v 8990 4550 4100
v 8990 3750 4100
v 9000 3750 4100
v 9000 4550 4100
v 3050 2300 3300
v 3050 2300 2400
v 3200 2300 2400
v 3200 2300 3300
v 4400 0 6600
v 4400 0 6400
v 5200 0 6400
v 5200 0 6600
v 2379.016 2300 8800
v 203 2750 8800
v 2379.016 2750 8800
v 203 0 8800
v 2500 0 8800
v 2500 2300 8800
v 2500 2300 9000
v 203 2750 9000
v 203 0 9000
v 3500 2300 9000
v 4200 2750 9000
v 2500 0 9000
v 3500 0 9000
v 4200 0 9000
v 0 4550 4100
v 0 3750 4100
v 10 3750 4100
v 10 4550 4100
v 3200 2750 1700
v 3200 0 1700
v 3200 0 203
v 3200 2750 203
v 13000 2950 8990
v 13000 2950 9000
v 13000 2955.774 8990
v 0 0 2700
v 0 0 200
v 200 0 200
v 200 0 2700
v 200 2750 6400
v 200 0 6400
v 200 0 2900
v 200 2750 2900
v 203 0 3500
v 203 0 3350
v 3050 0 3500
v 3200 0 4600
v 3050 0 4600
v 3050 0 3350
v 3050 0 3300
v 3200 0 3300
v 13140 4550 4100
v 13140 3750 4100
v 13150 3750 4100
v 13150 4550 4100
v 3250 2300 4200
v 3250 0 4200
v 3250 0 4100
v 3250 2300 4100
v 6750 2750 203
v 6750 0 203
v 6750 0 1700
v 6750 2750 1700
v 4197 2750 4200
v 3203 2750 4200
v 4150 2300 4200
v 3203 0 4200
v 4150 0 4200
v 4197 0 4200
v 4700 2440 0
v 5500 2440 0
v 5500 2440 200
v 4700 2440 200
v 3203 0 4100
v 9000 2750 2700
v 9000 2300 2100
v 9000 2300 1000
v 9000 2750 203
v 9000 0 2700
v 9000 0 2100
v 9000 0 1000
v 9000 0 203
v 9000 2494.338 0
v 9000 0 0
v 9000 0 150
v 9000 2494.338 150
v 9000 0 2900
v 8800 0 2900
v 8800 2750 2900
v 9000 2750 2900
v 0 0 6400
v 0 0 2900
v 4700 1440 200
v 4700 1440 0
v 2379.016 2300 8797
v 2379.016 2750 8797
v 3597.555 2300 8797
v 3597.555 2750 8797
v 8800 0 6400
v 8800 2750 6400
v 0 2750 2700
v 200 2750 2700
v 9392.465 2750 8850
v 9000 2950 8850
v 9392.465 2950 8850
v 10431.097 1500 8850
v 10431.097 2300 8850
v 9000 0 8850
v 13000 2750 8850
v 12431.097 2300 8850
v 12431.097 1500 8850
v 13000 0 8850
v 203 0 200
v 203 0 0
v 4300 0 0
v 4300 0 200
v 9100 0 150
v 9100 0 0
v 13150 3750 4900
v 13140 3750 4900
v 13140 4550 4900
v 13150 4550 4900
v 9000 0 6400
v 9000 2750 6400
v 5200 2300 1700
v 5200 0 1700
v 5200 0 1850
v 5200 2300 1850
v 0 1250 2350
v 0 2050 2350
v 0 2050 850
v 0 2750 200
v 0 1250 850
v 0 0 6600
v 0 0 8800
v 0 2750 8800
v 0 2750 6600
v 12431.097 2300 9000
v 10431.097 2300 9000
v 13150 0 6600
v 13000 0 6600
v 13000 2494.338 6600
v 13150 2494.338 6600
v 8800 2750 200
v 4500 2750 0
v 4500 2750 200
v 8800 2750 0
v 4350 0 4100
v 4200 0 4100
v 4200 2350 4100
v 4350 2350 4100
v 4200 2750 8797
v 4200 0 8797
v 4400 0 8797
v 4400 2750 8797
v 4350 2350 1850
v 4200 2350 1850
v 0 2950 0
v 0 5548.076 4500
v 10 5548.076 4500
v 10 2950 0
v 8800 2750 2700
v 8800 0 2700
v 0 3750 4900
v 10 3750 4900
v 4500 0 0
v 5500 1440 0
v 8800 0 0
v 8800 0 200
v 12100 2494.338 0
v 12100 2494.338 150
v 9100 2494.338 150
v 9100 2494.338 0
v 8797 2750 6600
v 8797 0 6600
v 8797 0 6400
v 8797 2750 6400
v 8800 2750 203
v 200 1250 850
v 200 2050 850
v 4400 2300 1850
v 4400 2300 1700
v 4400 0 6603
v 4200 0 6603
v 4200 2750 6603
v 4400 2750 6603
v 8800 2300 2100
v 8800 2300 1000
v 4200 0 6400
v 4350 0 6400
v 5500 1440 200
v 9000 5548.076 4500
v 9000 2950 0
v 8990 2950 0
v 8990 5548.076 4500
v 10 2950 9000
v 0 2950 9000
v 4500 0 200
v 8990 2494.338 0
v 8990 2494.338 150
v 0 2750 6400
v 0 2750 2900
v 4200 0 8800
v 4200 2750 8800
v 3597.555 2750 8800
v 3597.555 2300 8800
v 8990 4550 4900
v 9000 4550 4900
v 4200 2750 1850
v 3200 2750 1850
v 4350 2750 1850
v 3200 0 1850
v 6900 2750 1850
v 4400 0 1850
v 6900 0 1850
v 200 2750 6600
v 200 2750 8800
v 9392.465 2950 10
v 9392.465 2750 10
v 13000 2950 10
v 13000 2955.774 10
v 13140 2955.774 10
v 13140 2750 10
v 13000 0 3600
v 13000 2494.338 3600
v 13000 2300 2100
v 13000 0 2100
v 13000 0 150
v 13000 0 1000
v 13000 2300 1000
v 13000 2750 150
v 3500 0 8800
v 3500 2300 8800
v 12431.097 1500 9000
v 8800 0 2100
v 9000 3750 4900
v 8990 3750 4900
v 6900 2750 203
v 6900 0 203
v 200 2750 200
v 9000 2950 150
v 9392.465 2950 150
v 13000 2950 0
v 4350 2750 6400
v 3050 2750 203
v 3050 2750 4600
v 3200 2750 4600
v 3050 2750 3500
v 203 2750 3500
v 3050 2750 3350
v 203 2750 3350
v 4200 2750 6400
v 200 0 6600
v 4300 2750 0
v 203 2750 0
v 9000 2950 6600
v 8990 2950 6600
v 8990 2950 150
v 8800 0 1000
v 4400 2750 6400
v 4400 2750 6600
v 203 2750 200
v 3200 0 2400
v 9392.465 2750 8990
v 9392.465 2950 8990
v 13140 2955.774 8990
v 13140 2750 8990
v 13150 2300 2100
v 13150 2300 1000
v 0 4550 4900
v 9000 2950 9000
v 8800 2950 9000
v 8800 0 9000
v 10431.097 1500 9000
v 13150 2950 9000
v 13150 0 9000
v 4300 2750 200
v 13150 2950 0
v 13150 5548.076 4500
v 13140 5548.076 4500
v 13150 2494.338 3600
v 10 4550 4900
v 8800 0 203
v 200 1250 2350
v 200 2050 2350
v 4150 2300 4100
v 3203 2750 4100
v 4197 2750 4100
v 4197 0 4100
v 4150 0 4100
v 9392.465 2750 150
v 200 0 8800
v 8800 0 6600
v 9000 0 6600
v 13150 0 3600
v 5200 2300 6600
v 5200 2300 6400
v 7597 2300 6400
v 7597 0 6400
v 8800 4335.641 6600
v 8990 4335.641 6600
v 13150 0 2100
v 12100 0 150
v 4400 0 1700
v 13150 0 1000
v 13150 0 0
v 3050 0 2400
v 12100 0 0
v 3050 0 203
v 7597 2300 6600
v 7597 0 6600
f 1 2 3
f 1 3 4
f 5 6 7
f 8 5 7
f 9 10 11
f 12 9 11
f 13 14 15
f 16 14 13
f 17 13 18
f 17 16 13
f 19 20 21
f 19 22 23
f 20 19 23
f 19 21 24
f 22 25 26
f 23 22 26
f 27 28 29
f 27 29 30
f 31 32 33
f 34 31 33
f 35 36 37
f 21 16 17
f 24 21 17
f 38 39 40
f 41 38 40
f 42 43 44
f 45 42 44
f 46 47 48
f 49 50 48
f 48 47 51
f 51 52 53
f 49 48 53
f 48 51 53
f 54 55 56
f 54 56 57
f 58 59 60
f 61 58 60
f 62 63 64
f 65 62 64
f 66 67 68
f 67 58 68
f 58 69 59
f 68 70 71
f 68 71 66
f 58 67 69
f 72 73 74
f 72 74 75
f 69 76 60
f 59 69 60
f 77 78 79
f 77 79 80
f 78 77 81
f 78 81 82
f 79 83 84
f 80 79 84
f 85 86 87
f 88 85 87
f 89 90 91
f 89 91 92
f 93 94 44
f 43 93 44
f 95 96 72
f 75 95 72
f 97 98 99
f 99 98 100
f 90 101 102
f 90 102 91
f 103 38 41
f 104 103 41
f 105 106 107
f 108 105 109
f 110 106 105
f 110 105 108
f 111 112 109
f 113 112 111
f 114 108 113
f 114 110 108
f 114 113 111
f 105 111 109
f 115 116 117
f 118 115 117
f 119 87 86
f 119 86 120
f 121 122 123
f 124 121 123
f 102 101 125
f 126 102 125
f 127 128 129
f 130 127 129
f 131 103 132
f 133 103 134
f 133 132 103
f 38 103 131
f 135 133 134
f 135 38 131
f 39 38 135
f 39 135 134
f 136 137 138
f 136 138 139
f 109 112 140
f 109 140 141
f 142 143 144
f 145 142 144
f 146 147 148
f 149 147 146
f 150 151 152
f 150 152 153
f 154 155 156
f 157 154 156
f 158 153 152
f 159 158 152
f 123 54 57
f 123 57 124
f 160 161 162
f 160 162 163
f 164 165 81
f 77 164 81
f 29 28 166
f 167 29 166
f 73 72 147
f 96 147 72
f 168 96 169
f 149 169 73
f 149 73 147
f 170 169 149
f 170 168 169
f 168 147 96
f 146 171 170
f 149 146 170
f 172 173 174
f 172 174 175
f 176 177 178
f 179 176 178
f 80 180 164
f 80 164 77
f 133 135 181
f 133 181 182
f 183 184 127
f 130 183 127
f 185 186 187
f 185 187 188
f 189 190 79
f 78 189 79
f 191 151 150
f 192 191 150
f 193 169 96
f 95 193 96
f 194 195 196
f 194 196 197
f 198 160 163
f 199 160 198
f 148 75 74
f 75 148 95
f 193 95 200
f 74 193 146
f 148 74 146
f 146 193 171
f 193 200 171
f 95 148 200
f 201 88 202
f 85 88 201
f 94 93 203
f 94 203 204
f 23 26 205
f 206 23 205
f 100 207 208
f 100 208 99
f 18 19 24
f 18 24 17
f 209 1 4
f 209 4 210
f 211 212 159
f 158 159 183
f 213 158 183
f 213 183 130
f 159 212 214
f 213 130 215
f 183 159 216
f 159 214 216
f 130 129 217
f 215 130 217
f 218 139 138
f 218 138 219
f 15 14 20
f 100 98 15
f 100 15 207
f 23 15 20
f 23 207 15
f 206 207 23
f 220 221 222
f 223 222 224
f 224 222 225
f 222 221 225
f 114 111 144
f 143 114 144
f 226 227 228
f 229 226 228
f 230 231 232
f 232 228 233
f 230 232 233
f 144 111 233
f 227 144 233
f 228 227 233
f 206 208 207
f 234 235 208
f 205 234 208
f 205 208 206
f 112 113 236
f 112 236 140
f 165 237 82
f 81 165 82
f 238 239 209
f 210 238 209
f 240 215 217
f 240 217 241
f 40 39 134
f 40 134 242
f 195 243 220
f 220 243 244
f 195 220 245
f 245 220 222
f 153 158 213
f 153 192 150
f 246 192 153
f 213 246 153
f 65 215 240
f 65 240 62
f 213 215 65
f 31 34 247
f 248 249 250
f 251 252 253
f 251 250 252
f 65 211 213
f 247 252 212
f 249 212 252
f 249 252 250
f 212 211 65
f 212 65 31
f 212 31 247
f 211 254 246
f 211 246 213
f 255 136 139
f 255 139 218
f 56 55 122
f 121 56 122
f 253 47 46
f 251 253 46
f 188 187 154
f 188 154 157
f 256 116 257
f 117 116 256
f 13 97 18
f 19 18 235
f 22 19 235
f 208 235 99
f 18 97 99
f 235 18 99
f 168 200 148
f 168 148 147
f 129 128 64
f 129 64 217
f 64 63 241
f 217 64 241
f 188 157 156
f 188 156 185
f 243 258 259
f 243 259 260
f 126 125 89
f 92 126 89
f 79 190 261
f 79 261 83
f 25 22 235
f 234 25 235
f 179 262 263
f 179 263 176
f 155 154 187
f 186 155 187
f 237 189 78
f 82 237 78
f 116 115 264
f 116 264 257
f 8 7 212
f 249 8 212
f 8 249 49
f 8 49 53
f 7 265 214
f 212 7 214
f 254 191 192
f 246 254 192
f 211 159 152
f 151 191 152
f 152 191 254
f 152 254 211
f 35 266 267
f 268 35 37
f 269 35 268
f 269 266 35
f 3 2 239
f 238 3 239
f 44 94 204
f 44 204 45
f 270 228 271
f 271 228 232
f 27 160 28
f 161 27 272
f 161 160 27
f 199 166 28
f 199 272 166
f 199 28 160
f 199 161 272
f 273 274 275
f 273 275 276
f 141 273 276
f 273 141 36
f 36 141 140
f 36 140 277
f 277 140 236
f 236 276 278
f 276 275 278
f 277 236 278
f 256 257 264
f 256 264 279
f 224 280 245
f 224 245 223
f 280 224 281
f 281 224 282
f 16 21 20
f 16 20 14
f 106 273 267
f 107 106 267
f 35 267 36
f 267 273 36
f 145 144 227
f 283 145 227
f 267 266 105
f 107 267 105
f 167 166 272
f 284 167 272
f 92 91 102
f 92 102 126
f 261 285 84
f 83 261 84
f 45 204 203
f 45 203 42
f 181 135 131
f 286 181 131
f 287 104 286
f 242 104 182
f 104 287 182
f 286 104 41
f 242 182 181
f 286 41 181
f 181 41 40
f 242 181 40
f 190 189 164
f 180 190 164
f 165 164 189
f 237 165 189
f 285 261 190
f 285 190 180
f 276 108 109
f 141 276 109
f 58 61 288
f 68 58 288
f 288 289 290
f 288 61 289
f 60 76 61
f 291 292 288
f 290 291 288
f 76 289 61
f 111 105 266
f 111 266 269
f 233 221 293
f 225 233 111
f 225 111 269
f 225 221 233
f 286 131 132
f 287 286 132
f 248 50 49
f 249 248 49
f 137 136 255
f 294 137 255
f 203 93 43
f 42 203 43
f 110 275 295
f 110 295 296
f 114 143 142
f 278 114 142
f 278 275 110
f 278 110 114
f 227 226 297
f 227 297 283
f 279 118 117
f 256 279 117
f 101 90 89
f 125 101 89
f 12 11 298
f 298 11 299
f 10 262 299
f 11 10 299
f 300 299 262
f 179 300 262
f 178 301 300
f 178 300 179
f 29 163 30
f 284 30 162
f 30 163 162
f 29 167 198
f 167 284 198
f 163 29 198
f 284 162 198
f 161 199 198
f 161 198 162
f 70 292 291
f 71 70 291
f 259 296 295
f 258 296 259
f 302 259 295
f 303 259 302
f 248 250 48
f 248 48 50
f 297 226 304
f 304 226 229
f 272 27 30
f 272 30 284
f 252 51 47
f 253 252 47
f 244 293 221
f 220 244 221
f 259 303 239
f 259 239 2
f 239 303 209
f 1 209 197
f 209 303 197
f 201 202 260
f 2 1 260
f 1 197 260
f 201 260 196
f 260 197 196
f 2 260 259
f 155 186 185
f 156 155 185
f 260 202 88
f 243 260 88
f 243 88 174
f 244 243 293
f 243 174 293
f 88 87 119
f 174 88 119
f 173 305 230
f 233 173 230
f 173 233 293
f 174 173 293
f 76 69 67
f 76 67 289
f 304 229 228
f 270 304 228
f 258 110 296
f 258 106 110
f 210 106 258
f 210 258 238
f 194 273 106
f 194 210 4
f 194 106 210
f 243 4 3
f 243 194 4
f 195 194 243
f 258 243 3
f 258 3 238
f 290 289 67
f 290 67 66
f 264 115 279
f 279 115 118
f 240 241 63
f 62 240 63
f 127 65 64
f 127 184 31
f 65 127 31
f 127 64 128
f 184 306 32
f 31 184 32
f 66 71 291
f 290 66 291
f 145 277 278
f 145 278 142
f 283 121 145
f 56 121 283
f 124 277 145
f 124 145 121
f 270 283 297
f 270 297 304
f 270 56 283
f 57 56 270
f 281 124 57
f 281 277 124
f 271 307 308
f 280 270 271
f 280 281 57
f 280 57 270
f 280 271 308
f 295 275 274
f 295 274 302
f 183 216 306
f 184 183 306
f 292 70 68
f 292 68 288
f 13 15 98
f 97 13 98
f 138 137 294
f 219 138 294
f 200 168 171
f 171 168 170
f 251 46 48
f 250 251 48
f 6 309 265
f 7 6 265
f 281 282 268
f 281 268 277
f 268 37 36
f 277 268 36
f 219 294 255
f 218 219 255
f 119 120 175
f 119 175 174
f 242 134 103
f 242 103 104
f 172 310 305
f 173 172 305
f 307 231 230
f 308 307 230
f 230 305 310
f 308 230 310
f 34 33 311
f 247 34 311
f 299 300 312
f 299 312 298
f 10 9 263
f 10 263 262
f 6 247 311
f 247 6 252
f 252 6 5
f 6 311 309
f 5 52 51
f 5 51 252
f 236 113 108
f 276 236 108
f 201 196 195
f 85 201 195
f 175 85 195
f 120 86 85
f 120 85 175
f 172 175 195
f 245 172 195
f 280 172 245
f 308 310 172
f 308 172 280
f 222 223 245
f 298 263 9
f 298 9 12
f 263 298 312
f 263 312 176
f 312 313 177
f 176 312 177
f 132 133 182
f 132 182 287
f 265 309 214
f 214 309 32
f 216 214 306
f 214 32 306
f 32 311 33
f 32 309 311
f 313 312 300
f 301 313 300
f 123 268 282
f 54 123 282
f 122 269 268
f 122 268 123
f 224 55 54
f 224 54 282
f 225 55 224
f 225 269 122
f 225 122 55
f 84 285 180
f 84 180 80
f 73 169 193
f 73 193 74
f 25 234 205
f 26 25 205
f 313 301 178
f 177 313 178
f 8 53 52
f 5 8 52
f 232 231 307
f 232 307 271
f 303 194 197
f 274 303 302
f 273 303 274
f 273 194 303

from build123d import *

# Parameters (mm, degrees)
SKETCH_1_W          = 200
SKETCH_1_H          = 797
EXTRUDE_3_DEPTH     = 2750
SKETCH_1_W_2        = 4097
SKETCH_1_H_2        = 200
EXTRUDE_3_2_DEPTH   = 2750
SKETCH_1_H_3        = 2500
EXTRUDE_3_3_DEPTH   = 2750
SKETCH_1_W_3        = 2297
EXTRUDE_3_4_DEPTH   = 2750
SKETCH_1_H_4        = 2194
EXTRUDE_3_5_DEPTH   = 2750
SKETCH_1_W_4        = 1200
EXTRUDE_3_6_DEPTH   = 2750
SKETCH_1_W_5        = 700
EXTRUDE_3_7_DEPTH   = 2750
SKETCH_1_W_6        = 1197
EXTRUDE_3_8_DEPTH   = 2750
SKETCH_1_H_5        = 600
EXTRUDE_3_9_DEPTH   = 2750
SKETCH_1_W_7        = 150
SKETCH_1_H_6        = 2300
EXTRUDE_3_10_DEPTH  = 2750
SKETCH_1_H_7        = 2200
EXTRUDE_3_11_DEPTH  = 2750
SKETCH_1_H_8        = 3500
EXTRUDE_3_12_DEPTH  = 2750
EXTRUDE_3_13_DEPTH  = 2750
SKETCH_1_W_8        = 4300
EXTRUDE_3_14_DEPTH  = 2750
EXTRUDE_3_15_DEPTH  = 2750
EXTRUDE_3_16_DEPTH  = 2750
SKETCH_1_W_9        = 47
SKETCH_1_H_9        = 100
EXTRUDE_3_17_DEPTH  = 2750
EXTRUDE_3_18_DEPTH  = 2750
EXTRUDE_3_19_DEPTH  = 2750
SKETCH_2_W          = 1500
SKETCH_2_H          = 800
CUT_EXTRUDE_2_DEPTH = 250
SKETCH_3_W          = 800
SKETCH_3_H          = 1000
CUT_EXTRUDE_3_DEPTH = 593
SKETCH_4_W          = 947
SKETCH_4_H          = 100
SKETCH_4_W_2        = 150
SKETCH_4_H_2        = 978.549648511
SKETCH_4_W_3        = 1152.585456484
SKETCH_4_H_3        = 150
SKETCH_4_W_4        = 2267.433140047
SKETCH_4_H_4        = 200
SKETCH_4_W_5        = 200
SKETCH_4_H_5        = 1253.150135291
SKETCH_4_W_6        = 1218.539312582
SKETCH_4_H_6        = 203
EXTRUDE_4_DEPTH     = 450
EXTRUDE_5_DEPTH     = 150
SKETCH_6_W          = 1100
SKETCH_6_H          = 2300
SKETCH_6_W_2        = 3000
SKETCH_6_H_2        = 2644.337567297
CUT_EXTRUDE_5_DEPTH = 670
SKETCH_8_W          = 800
SKETCH_8_H          = 800
EXTRUDE_8_DEPTH     = 10
EXTRUDE_9_DEPTH     = 200
SKETCH_10_W         = 4000
SKETCH_10_H         = 150
SKETCH_10_W_2       = 900
SKETCH_10_W_3       = 100
EXTRUDE_10_DEPTH    = 2950
SKETCH_11_W         = 2397
SKETCH_11_H         = 2635.525513421
SKETCH_11_W_2       = 1000
SKETCH_11_H_2       = 2423.148146905
SKETCH_11_W_3       = 2000
SKETCH_11_H_3       = 800
CUT_EXTRUDE_6_DEPTH = 5123
SKETCH_8_2_W        = 800
SKETCH_8_2_H        = 800
CUT_EXTRUDE_7_DEPTH = 16606
SKETCH_16_W         = 150
SKETCH_16_H         = 455.662432703
EXTRUDE_16_DEPTH    = 4160
SKETCH_17_W         = 150
SKETCH_17_H         = 400
EXTRUDE_17_DEPTH    = 2250
SKETCH_18_W         = 345.470179312
SKETCH_18_H         = 6646.060485842
SKETCH_18_W_2       = 3747.534838004
SKETCH_18_H_2       = 8980
CUT_EXTRUDE_8_DEPTH = 5414


with BuildPart() as part:
    # Эскиз1 → Бобышка-Вытянуть3 (new body)
    with BuildSketch(Plane(origin=(0, 0, 0), x_dir=(1, 0, 0), z_dir=(0, 1, 0))):
        with Locations((8900, -601.5)):
            Rectangle(SKETCH_1_W, SKETCH_1_H)
    extrude(amount=EXTRUDE_3_DEPTH)



with BuildPart() as body_2:
    # Эскиз1 → Extrude 3 2 (new body)
    with BuildSketch(Plane(origin=(0, 0, 0), x_dir=(1, 0, 0), z_dir=(0, 1, 0))):
        with Locations((2251.5, -100)):
            Rectangle(SKETCH_1_W_2, SKETCH_1_H_2)
    extrude(amount=EXTRUDE_3_2_DEPTH)


with BuildPart() as body_3:
    # Эскиз1 → Extrude 3 3 (new body)
    with BuildSketch(Plane(origin=(0, 0, 0), x_dir=(1, 0, 0), z_dir=(0, 1, 0))):
        with Locations((100, -1450)):
            Rectangle(SKETCH_1_W, SKETCH_1_H_3)
    extrude(amount=EXTRUDE_3_3_DEPTH)

    # Эскиз2 → Вырез-Вытянуть2 (cut)
    with BuildSketch(Plane.ZY):
        with Locations((1600, 1650)):
            Rectangle(SKETCH_2_W, SKETCH_2_H)
    extrude(amount=-CUT_EXTRUDE_2_DEPTH, mode=Mode.SUBTRACT)


with BuildPart() as body_4:
    # Эскиз1 → Extrude 3 4 (new body)
    with BuildSketch(Plane(origin=(0, 0, 0), x_dir=(1, 0, 0), z_dir=(0, 1, 0))):
        with Locations((1351.5, -8900)):
            Rectangle(SKETCH_1_W_3, SKETCH_1_H_2)
    extrude(amount=EXTRUDE_3_4_DEPTH)


with BuildPart() as body_5:
    # Эскиз1 → Extrude 3 5 (new body)
    with BuildSketch(Plane(origin=(0, 0, 0), x_dir=(1, 0, 0), z_dir=(0, 1, 0))):
        with Locations((4300, -7700)):
            Rectangle(SKETCH_1_W, SKETCH_1_H_4)
    extrude(amount=EXTRUDE_3_5_DEPTH)


with BuildPart() as body_6:
    # Эскиз1 → Extrude 3 6 (new body)
    with BuildSketch(Plane(origin=(0, 0, 0), x_dir=(1, 0, 0), z_dir=(0, 1, 0))):
        with Locations((8197, -6500)):
            Rectangle(SKETCH_1_W_4, SKETCH_1_H_2)
    extrude(amount=EXTRUDE_3_6_DEPTH)


with BuildPart() as body_7:
    # Эскиз1 → Extrude 3 7 (new body)
    with BuildSketch(Plane(origin=(0, 0, 0), x_dir=(1, 0, 0), z_dir=(0, 1, 0))):
        with Locations((3850, -8900)):
            Rectangle(SKETCH_1_W_5, SKETCH_1_H_2)
    extrude(amount=EXTRUDE_3_7_DEPTH)


with BuildPart() as body_8:
    # Эскиз1 → Extrude 3 8 (new body)
    with BuildSketch(Plane(origin=(0, 0, 0), x_dir=(1, 0, 0), z_dir=(0, 1, 0))):
        with Locations((4998.5, -6500)):
            Rectangle(SKETCH_1_W_6, SKETCH_1_H_2)
    extrude(amount=EXTRUDE_3_8_DEPTH)


with BuildPart() as body_9:
    # Эскиз1 → Extrude 3 9 (new body)
    with BuildSketch(Plane(origin=(0, 0, 0), x_dir=(1, 0, 0), z_dir=(0, 1, 0))):
        with Locations((8900, -2400)):
            Rectangle(SKETCH_1_W, SKETCH_1_H_5)
    extrude(amount=EXTRUDE_3_9_DEPTH)


with BuildPart() as body_10:
    # Эскиз1 → Extrude 3 10 (new body)
    with BuildSketch(Plane(origin=(0, 0, 0), x_dir=(1, 0, 0), z_dir=(0, 1, 0))):
        with Locations((4275, -5250)):
            Rectangle(SKETCH_1_W_7, SKETCH_1_H_6)
    extrude(amount=EXTRUDE_3_10_DEPTH)


with BuildPart() as body_11:
    # Эскиз1 → Extrude 3 11 (new body)
    with BuildSketch(Plane(origin=(0, 0, 0), x_dir=(1, 0, 0), z_dir=(0, 1, 0))):
        with Locations((100, -7700)):
            Rectangle(SKETCH_1_W, SKETCH_1_H_7)
    extrude(amount=EXTRUDE_3_11_DEPTH)


with BuildPart() as body_12:
    # Эскиз1 → Extrude 3 12 (new body)
    with BuildSketch(Plane(origin=(0, 0, 0), x_dir=(1, 0, 0), z_dir=(0, 1, 0))):
        with Locations((8900, -4650)):
            Rectangle(SKETCH_1_W, SKETCH_1_H_8)
    extrude(amount=EXTRUDE_3_12_DEPTH)


with BuildPart() as body_13:
    # Эскиз1 → Extrude 3 13 (new body)
    with BuildSketch(Plane(origin=(0, 0, 0), x_dir=(1, 0, 0), z_dir=(0, 1, 0))):
        with Locations((100, -4650)):
            Rectangle(SKETCH_1_W, SKETCH_1_H_8)
    extrude(amount=EXTRUDE_3_13_DEPTH)


with BuildPart() as body_14:
    # Эскиз1 → Extrude 3 14 (new body)
    with BuildSketch(Plane(origin=(0, 0, 0), x_dir=(1, 0, 0), z_dir=(0, 1, 0))):
        with Locations((6650, -100)):
            Rectangle(SKETCH_1_W_8, SKETCH_1_H_2)
    extrude(amount=EXTRUDE_3_14_DEPTH)

    # Эскиз3 → Вырез-Вытянуть3 (cut)
    with BuildSketch(Plane(origin=(0, 0, 0), x_dir=(-1, 0, 0), z_dir=(0, 0, -1))):
        with Locations((-5100, 1940)):
            Rectangle(SKETCH_3_W, SKETCH_3_H)
    extrude(amount=-CUT_EXTRUDE_3_DEPTH, mode=Mode.SUBTRACT)


with BuildPart() as body_15:
    # Эскиз1 → Extrude 3 15 (new body)
    with BuildSketch(Plane(origin=(0, 0, 0), x_dir=(1, 0, 0), z_dir=(0, 1, 0))):
        Polygon((3200, -203), (3050, -203), (3050, -2400), (3200, -2400), (3200, -1850), (4400, -1850), (4400, -1700), (3200, -1700), align=None)
    extrude(amount=EXTRUDE_3_15_DEPTH)


with BuildPart() as body_16:
    # Эскиз1 → Extrude 3 16 (new body)
    with BuildSketch(Plane(origin=(0, 0, 0), x_dir=(1, 0, 0), z_dir=(0, 1, 0))):
        Polygon((3200, -3300), (3050, -3300), (3050, -3350), (203, -3350), (203, -3500), (3050, -3500), (3050, -4600), (3200, -4600), align=None)
    extrude(amount=EXTRUDE_3_16_DEPTH)


with BuildPart() as body_17:
    # Эскиз1 → Extrude 3 17 (new body)
    with BuildSketch(Plane(origin=(0, 0, 0), x_dir=(1, 0, 0), z_dir=(0, 1, 0))):
        with Locations((4173.5, -4150)):
            Rectangle(SKETCH_1_W_9, SKETCH_1_H_9)
    extrude(amount=EXTRUDE_3_17_DEPTH)


with BuildPart() as body_18:
    # Эскиз1 → Extrude 3 18 (new body)
    with BuildSketch(Plane(origin=(0, 0, 0), x_dir=(1, 0, 0), z_dir=(0, 1, 0))):
        Polygon((6750, -1700), (5200, -1700), (5200, -1850), (6900, -1850), (6900, -203), (6750, -203), align=None)
    extrude(amount=EXTRUDE_3_18_DEPTH)


with BuildPart() as body_19:
    # Эскиз1 → Extrude 3 19 (new body)
    with BuildSketch(Plane(origin=(0, 0, 0), x_dir=(1, 0, 0), z_dir=(0, 1, 0))):
        with Locations((3226.5, -4150)):
            Rectangle(SKETCH_1_W_9, SKETCH_1_H_9)
    extrude(amount=EXTRUDE_3_19_DEPTH)


with BuildPart() as part_1:
    add(part.part)

    add(body_4.part)  # Бобышка-Вытянуть4 merges body 4

    add(body_6.part)  # Бобышка-Вытянуть4 merges body 6

    add(body_7.part)  # Бобышка-Вытянуть4 merges body 7

    add(body_8.part)  # Бобышка-Вытянуть4 merges body 8

    add(body_9.part)  # Бобышка-Вытянуть4 merges body 9

    add(body_15.part)  # Бобышка-Вытянуть4 merges body 15

    add(body_16.part)  # Бобышка-Вытянуть4 merges body 16

    add(body_17.part)  # Бобышка-Вытянуть4 merges body 17

    add(body_18.part)  # Бобышка-Вытянуть4 merges body 18

    add(body_19.part)  # Бобышка-Вытянуть4 merges body 19
    # Эскиз4 → Бобышка-Вытянуть4 (add)
    with BuildSketch(Plane(origin=(0, 2750, 0), x_dir=(1, 0, 0), z_dir=(0, 1, 0))):
        with Locations((3700, -4150)):
            Rectangle(SKETCH_4_W, SKETCH_4_H)
        with Locations((3125, -2835.725175745)):
            Rectangle(SKETCH_4_W_2, SKETCH_4_H_2)
        with Locations((4825.793421021, -1775)):
            Rectangle(SKETCH_4_W_3, SKETCH_4_H_3)
        with Locations((6556.719626978, -6500)):
            Rectangle(SKETCH_4_W_4, SKETCH_4_H_4)
        with Locations((8900, -1527.400889881)):
            Rectangle(SKETCH_4_W_5, SKETCH_4_H_5)
        with Locations((2988.285525283, -8898.5)):
            Rectangle(SKETCH_4_W_6, SKETCH_4_H_6)
    extrude(amount=-EXTRUDE_4_DEPTH)


with BuildPart() as body_10_2:
    # Эскиз5 → Бобышка-Вытянуть5 (new body)
    with BuildSketch(Plane(origin=(13000, 0, 0), x_dir=(0, 0, -1), z_dir=(1, 0, 0))):
        Polygon((-4500, 5548.076211353), (-9000, 2950), (-9000, 0), (0, 0), (0, 2950), align=None)
    extrude(amount=EXTRUDE_5_DEPTH)

    # Эскиз6 → Вырез-Вытянуть5 (cut)
    with BuildSketch(Plane(origin=(13000, 0, 0), x_dir=(0, 0, -1), z_dir=(1, 0, 0))):
        with Locations((-1550, 1150)):
            Rectangle(SKETCH_6_W, SKETCH_6_H)
        with Locations((-5100, 1172.168783649)):
            Rectangle(SKETCH_6_W_2, SKETCH_6_H_2)
    extrude(amount=CUT_EXTRUDE_5_DEPTH, mode=Mode.SUBTRACT)



with BuildPart() as body_11_2:
    # Эскиз8 → Бобышка-Вытянуть8 (new body)
    with BuildSketch(Plane.ZY):
        Polygon((4500, 5548.076211353), (0, 2950), (9000, 2950), align=None)
        with Locations((4500, 4150)):
            Rectangle(SKETCH_8_W, SKETCH_8_H, mode=Mode.SUBTRACT)
    extrude(amount=-EXTRUDE_8_DEPTH)


with BuildPart() as body_12_2:
    # Эскиз9 → Бобышка-Вытянуть9 (new body)
    with BuildSketch(Plane(origin=(9000, 0, 0), x_dir=(0, 0, -1), z_dir=(1, 0, 0))):
        Polygon((-6600, 0), (-6600, 2950), (0, 2950), (-4500, 5548.076211353), (-9000, 2950), (-9000, 0), align=None)
    extrude(amount=-EXTRUDE_9_DEPTH)


with BuildPart() as body_10_2_1:
    add(body_10_2.part)

    add(body_12_2.part)  # Бобышка-Вытянуть10 merges body 12 2
    # Эскиз10 → Бобышка-Вытянуть10 (add)
    with BuildSketch(Plane.XZ):
        with Locations((11000, 8925)):
            Rectangle(SKETCH_10_W, SKETCH_10_H)
        with Locations((12550, 75)):
            Rectangle(SKETCH_10_W_2, SKETCH_10_H)
        with Locations((9050, 75)):
            Rectangle(SKETCH_10_W_3, SKETCH_10_H)
    extrude(amount=-EXTRUDE_10_DEPTH)


with BuildPart() as cut_extrude_6_tool:
    # Эскиз11 → Вырез-Вытянуть6 (new body)
    with BuildSketch(Plane(origin=(0, 0, 6400), x_dir=(-1, 0, 0), z_dir=(0, 0, -1))):
        with Locations((-6398.5, 982.237243289)):
            Rectangle(SKETCH_11_W, SKETCH_11_H)
        with Locations((-3000, 1088.425926548)):
            Rectangle(SKETCH_11_W_2, SKETCH_11_H_2)
        with Locations((-11431.097201215, 1900)):
            Rectangle(SKETCH_11_W_3, SKETCH_11_H_3)
    extrude(amount=-CUT_EXTRUDE_6_DEPTH)


with BuildPart() as part_2:
    add(part_1.part)

    # Вырез-Вытянуть6: cut by cut_extrude_6_tool
    add(cut_extrude_6_tool.part, mode=Mode.SUBTRACT)


    add(body_10.part)  # Бобышка-Вытянуть17 merges body 10
    # Эскиз17 → Бобышка-Вытянуть17 (add)
    with BuildSketch(Plane(origin=(0, 0, 4100), x_dir=(-1, 0, 0), z_dir=(0, 0, -1))):
        with Locations((-4275, 2550)):
            Rectangle(SKETCH_17_W, SKETCH_17_H)
    extrude(amount=EXTRUDE_17_DEPTH)


with BuildPart() as body_10_2_2:
    add(body_10_2_1.part)

    # Вырез-Вытянуть6: cut by cut_extrude_6_tool
    add(cut_extrude_6_tool.part, mode=Mode.SUBTRACT)

    # Эскиз8<2> → Вырез-Вытянуть7 (cut)
    with BuildSketch(Plane.ZY):
        with Locations((4500, 4150)):
            Rectangle(SKETCH_8_2_W, SKETCH_8_2_H)
    extrude(amount=-CUT_EXTRUDE_7_DEPTH, mode=Mode.SUBTRACT)

    # Эскиз16 → Бобышка-Вытянуть16 (add)
    with BuildSketch(Plane(origin=(13150, 0, 0), x_dir=(0, 0, -1), z_dir=(1, 0, 0))):
        with Locations((-75, 2722.168783648)):
            Rectangle(SKETCH_16_W, SKETCH_16_H)
    extrude(amount=-EXTRUDE_16_DEPTH)

    # Эскиз18 → Вырез-Вытянуть8 (cut)
    with BuildSketch(Plane(origin=(0, 2750, 0), x_dir=(1, 0, 0), z_dir=(0, 1, 0))):
        with Locations((8817.264910344, -3276.969757079)):
            Rectangle(SKETCH_18_W, SKETCH_18_H)
        with Locations((11266.232580998, -4500)):
            Rectangle(SKETCH_18_W_2, SKETCH_18_H_2)
    extrude(amount=CUT_EXTRUDE_8_DEPTH, mode=Mode.SUBTRACT)


solid = Compound([body_2.part, body_3.part, body_5.part, body_11.part, body_12.part, body_13.part, body_14.part, body_11_2.part, part_2.part, body_10_2_2.part])
